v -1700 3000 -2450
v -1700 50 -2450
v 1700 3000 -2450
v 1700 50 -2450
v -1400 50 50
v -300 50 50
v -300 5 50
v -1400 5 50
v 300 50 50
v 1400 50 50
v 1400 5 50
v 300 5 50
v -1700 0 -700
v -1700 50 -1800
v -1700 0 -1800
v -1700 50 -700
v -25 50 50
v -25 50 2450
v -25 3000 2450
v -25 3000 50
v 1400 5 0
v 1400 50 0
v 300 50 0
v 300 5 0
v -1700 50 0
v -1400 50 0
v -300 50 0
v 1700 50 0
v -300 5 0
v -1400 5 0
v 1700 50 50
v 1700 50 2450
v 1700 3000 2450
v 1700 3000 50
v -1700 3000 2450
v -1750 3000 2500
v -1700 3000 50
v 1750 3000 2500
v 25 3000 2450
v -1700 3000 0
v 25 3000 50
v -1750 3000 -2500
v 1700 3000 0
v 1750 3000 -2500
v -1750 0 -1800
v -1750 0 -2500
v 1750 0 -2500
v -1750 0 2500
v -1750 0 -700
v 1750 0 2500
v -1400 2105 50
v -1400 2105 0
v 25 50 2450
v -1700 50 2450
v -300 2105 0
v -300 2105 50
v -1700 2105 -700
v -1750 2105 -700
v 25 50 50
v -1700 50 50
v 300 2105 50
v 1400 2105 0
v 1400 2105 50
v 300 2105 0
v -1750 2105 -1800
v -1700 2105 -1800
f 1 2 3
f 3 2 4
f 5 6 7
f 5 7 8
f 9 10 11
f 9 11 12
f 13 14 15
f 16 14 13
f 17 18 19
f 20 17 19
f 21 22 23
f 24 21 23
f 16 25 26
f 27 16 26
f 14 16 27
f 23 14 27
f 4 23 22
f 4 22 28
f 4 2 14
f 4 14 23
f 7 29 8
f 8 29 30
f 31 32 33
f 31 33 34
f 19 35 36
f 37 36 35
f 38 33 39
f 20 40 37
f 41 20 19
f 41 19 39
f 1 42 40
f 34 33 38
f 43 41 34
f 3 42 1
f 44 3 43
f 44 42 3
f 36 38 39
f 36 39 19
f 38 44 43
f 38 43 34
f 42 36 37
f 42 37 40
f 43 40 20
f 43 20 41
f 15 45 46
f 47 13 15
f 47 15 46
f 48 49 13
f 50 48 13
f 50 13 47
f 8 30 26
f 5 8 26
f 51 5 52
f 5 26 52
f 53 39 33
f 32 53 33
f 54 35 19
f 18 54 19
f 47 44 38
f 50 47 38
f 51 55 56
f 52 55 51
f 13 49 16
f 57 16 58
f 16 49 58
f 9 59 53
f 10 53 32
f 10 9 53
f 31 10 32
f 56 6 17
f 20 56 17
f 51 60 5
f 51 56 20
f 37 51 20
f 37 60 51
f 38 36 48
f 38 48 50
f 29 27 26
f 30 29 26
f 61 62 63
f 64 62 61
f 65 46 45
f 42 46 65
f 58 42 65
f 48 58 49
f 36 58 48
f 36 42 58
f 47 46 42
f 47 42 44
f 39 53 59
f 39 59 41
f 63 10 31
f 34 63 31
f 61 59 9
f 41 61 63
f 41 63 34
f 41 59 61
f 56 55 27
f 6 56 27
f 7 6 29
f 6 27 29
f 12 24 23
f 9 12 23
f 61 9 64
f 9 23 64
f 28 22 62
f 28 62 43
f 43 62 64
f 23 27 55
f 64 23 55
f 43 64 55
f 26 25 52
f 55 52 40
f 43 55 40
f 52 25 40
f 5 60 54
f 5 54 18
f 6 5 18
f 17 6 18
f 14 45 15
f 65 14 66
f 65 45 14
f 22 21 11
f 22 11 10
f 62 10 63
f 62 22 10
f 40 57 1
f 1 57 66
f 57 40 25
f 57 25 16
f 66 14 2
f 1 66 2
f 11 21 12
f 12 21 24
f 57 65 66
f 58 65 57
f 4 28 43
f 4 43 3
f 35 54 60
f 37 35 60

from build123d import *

# Parameters (mm, degrees)
SKETCH2_W           = 3500
SKETCH2_H           = 5000
BOSS_EXTRUDE1_DEPTH = 3000
SHELL1_T            = -50
SKETCH3_W           = 1100
SKETCH3_H           = 2105
CUT_EXTRUDE1_DEPTH  = 50
SKETCH4_W           = 50
SKETCH4_H           = 3000
BOSS_EXTRUDE2_DEPTH = 3500
SKETCH6_W           = 50
SKETCH6_H           = 3000
BOSS_EXTRUDE3_DEPTH = 2500
SKETCH7_W           = 1100
SKETCH7_H           = 2055
SKETCH7_H_2         = 45
SKETCH7_H_3         = 2100
CUT_EXTRUDE5_DEPTH  = 50


with BuildPart() as part:
    # Sketch2 → Boss-Extrude1 (new body)
    with BuildSketch(Plane(origin=(0, 0, 0), x_dir=(1, 0, 0), z_dir=(0, 1, 0))):
        Rectangle(SKETCH2_W, SKETCH2_H)
    extrude(amount=BOSS_EXTRUDE1_DEPTH)

    # Shell1
    shell1_openings = [part.faces().sort_by_distance(p)[0] for p in [
        (0, 3000, 0),
    ]]
    offset(amount=SHELL1_T, openings=shell1_openings, kind=Kind.INTERSECTION)

    # Sketch3 → Cut-Extrude1 (cut)
    with BuildSketch(Plane.ZY.offset(1750)):
        with Locations((-1250, 1052.5)):
            Rectangle(SKETCH3_W, SKETCH3_H)
    extrude(amount=-CUT_EXTRUDE1_DEPTH, mode=Mode.SUBTRACT)

    # Sketch4 → Boss-Extrude2 (add)
    with BuildSketch(Plane.ZY.offset(1750)):
        with Locations((25, 1500)):
            Rectangle(SKETCH4_W, SKETCH4_H)
    extrude(amount=-BOSS_EXTRUDE2_DEPTH)

    # Sketch6 → Boss-Extrude3 (add)
    with BuildSketch(Plane.XY.offset(2500)):
        with Locations((0, 1500)):
            Rectangle(SKETCH6_W, SKETCH6_H)
    extrude(amount=-BOSS_EXTRUDE3_DEPTH)

    # Sketch7 → Cut-Extrude5 (cut)
    with BuildSketch(Plane(origin=(0, 0, 0), x_dir=(-1, 0, 0), z_dir=(0, 0, -1))):
        with Locations((850, 1077.5)):
            Rectangle(SKETCH7_W, SKETCH7_H)
        with Locations((850, 27.5)):
            Rectangle(SKETCH7_W, SKETCH7_H_2)
        with Locations((-850, 1055)):
            Rectangle(SKETCH7_W, SKETCH7_H_3)
    extrude(amount=-CUT_EXTRUDE5_DEPTH, mode=Mode.SUBTRACT)


solid = part.part
